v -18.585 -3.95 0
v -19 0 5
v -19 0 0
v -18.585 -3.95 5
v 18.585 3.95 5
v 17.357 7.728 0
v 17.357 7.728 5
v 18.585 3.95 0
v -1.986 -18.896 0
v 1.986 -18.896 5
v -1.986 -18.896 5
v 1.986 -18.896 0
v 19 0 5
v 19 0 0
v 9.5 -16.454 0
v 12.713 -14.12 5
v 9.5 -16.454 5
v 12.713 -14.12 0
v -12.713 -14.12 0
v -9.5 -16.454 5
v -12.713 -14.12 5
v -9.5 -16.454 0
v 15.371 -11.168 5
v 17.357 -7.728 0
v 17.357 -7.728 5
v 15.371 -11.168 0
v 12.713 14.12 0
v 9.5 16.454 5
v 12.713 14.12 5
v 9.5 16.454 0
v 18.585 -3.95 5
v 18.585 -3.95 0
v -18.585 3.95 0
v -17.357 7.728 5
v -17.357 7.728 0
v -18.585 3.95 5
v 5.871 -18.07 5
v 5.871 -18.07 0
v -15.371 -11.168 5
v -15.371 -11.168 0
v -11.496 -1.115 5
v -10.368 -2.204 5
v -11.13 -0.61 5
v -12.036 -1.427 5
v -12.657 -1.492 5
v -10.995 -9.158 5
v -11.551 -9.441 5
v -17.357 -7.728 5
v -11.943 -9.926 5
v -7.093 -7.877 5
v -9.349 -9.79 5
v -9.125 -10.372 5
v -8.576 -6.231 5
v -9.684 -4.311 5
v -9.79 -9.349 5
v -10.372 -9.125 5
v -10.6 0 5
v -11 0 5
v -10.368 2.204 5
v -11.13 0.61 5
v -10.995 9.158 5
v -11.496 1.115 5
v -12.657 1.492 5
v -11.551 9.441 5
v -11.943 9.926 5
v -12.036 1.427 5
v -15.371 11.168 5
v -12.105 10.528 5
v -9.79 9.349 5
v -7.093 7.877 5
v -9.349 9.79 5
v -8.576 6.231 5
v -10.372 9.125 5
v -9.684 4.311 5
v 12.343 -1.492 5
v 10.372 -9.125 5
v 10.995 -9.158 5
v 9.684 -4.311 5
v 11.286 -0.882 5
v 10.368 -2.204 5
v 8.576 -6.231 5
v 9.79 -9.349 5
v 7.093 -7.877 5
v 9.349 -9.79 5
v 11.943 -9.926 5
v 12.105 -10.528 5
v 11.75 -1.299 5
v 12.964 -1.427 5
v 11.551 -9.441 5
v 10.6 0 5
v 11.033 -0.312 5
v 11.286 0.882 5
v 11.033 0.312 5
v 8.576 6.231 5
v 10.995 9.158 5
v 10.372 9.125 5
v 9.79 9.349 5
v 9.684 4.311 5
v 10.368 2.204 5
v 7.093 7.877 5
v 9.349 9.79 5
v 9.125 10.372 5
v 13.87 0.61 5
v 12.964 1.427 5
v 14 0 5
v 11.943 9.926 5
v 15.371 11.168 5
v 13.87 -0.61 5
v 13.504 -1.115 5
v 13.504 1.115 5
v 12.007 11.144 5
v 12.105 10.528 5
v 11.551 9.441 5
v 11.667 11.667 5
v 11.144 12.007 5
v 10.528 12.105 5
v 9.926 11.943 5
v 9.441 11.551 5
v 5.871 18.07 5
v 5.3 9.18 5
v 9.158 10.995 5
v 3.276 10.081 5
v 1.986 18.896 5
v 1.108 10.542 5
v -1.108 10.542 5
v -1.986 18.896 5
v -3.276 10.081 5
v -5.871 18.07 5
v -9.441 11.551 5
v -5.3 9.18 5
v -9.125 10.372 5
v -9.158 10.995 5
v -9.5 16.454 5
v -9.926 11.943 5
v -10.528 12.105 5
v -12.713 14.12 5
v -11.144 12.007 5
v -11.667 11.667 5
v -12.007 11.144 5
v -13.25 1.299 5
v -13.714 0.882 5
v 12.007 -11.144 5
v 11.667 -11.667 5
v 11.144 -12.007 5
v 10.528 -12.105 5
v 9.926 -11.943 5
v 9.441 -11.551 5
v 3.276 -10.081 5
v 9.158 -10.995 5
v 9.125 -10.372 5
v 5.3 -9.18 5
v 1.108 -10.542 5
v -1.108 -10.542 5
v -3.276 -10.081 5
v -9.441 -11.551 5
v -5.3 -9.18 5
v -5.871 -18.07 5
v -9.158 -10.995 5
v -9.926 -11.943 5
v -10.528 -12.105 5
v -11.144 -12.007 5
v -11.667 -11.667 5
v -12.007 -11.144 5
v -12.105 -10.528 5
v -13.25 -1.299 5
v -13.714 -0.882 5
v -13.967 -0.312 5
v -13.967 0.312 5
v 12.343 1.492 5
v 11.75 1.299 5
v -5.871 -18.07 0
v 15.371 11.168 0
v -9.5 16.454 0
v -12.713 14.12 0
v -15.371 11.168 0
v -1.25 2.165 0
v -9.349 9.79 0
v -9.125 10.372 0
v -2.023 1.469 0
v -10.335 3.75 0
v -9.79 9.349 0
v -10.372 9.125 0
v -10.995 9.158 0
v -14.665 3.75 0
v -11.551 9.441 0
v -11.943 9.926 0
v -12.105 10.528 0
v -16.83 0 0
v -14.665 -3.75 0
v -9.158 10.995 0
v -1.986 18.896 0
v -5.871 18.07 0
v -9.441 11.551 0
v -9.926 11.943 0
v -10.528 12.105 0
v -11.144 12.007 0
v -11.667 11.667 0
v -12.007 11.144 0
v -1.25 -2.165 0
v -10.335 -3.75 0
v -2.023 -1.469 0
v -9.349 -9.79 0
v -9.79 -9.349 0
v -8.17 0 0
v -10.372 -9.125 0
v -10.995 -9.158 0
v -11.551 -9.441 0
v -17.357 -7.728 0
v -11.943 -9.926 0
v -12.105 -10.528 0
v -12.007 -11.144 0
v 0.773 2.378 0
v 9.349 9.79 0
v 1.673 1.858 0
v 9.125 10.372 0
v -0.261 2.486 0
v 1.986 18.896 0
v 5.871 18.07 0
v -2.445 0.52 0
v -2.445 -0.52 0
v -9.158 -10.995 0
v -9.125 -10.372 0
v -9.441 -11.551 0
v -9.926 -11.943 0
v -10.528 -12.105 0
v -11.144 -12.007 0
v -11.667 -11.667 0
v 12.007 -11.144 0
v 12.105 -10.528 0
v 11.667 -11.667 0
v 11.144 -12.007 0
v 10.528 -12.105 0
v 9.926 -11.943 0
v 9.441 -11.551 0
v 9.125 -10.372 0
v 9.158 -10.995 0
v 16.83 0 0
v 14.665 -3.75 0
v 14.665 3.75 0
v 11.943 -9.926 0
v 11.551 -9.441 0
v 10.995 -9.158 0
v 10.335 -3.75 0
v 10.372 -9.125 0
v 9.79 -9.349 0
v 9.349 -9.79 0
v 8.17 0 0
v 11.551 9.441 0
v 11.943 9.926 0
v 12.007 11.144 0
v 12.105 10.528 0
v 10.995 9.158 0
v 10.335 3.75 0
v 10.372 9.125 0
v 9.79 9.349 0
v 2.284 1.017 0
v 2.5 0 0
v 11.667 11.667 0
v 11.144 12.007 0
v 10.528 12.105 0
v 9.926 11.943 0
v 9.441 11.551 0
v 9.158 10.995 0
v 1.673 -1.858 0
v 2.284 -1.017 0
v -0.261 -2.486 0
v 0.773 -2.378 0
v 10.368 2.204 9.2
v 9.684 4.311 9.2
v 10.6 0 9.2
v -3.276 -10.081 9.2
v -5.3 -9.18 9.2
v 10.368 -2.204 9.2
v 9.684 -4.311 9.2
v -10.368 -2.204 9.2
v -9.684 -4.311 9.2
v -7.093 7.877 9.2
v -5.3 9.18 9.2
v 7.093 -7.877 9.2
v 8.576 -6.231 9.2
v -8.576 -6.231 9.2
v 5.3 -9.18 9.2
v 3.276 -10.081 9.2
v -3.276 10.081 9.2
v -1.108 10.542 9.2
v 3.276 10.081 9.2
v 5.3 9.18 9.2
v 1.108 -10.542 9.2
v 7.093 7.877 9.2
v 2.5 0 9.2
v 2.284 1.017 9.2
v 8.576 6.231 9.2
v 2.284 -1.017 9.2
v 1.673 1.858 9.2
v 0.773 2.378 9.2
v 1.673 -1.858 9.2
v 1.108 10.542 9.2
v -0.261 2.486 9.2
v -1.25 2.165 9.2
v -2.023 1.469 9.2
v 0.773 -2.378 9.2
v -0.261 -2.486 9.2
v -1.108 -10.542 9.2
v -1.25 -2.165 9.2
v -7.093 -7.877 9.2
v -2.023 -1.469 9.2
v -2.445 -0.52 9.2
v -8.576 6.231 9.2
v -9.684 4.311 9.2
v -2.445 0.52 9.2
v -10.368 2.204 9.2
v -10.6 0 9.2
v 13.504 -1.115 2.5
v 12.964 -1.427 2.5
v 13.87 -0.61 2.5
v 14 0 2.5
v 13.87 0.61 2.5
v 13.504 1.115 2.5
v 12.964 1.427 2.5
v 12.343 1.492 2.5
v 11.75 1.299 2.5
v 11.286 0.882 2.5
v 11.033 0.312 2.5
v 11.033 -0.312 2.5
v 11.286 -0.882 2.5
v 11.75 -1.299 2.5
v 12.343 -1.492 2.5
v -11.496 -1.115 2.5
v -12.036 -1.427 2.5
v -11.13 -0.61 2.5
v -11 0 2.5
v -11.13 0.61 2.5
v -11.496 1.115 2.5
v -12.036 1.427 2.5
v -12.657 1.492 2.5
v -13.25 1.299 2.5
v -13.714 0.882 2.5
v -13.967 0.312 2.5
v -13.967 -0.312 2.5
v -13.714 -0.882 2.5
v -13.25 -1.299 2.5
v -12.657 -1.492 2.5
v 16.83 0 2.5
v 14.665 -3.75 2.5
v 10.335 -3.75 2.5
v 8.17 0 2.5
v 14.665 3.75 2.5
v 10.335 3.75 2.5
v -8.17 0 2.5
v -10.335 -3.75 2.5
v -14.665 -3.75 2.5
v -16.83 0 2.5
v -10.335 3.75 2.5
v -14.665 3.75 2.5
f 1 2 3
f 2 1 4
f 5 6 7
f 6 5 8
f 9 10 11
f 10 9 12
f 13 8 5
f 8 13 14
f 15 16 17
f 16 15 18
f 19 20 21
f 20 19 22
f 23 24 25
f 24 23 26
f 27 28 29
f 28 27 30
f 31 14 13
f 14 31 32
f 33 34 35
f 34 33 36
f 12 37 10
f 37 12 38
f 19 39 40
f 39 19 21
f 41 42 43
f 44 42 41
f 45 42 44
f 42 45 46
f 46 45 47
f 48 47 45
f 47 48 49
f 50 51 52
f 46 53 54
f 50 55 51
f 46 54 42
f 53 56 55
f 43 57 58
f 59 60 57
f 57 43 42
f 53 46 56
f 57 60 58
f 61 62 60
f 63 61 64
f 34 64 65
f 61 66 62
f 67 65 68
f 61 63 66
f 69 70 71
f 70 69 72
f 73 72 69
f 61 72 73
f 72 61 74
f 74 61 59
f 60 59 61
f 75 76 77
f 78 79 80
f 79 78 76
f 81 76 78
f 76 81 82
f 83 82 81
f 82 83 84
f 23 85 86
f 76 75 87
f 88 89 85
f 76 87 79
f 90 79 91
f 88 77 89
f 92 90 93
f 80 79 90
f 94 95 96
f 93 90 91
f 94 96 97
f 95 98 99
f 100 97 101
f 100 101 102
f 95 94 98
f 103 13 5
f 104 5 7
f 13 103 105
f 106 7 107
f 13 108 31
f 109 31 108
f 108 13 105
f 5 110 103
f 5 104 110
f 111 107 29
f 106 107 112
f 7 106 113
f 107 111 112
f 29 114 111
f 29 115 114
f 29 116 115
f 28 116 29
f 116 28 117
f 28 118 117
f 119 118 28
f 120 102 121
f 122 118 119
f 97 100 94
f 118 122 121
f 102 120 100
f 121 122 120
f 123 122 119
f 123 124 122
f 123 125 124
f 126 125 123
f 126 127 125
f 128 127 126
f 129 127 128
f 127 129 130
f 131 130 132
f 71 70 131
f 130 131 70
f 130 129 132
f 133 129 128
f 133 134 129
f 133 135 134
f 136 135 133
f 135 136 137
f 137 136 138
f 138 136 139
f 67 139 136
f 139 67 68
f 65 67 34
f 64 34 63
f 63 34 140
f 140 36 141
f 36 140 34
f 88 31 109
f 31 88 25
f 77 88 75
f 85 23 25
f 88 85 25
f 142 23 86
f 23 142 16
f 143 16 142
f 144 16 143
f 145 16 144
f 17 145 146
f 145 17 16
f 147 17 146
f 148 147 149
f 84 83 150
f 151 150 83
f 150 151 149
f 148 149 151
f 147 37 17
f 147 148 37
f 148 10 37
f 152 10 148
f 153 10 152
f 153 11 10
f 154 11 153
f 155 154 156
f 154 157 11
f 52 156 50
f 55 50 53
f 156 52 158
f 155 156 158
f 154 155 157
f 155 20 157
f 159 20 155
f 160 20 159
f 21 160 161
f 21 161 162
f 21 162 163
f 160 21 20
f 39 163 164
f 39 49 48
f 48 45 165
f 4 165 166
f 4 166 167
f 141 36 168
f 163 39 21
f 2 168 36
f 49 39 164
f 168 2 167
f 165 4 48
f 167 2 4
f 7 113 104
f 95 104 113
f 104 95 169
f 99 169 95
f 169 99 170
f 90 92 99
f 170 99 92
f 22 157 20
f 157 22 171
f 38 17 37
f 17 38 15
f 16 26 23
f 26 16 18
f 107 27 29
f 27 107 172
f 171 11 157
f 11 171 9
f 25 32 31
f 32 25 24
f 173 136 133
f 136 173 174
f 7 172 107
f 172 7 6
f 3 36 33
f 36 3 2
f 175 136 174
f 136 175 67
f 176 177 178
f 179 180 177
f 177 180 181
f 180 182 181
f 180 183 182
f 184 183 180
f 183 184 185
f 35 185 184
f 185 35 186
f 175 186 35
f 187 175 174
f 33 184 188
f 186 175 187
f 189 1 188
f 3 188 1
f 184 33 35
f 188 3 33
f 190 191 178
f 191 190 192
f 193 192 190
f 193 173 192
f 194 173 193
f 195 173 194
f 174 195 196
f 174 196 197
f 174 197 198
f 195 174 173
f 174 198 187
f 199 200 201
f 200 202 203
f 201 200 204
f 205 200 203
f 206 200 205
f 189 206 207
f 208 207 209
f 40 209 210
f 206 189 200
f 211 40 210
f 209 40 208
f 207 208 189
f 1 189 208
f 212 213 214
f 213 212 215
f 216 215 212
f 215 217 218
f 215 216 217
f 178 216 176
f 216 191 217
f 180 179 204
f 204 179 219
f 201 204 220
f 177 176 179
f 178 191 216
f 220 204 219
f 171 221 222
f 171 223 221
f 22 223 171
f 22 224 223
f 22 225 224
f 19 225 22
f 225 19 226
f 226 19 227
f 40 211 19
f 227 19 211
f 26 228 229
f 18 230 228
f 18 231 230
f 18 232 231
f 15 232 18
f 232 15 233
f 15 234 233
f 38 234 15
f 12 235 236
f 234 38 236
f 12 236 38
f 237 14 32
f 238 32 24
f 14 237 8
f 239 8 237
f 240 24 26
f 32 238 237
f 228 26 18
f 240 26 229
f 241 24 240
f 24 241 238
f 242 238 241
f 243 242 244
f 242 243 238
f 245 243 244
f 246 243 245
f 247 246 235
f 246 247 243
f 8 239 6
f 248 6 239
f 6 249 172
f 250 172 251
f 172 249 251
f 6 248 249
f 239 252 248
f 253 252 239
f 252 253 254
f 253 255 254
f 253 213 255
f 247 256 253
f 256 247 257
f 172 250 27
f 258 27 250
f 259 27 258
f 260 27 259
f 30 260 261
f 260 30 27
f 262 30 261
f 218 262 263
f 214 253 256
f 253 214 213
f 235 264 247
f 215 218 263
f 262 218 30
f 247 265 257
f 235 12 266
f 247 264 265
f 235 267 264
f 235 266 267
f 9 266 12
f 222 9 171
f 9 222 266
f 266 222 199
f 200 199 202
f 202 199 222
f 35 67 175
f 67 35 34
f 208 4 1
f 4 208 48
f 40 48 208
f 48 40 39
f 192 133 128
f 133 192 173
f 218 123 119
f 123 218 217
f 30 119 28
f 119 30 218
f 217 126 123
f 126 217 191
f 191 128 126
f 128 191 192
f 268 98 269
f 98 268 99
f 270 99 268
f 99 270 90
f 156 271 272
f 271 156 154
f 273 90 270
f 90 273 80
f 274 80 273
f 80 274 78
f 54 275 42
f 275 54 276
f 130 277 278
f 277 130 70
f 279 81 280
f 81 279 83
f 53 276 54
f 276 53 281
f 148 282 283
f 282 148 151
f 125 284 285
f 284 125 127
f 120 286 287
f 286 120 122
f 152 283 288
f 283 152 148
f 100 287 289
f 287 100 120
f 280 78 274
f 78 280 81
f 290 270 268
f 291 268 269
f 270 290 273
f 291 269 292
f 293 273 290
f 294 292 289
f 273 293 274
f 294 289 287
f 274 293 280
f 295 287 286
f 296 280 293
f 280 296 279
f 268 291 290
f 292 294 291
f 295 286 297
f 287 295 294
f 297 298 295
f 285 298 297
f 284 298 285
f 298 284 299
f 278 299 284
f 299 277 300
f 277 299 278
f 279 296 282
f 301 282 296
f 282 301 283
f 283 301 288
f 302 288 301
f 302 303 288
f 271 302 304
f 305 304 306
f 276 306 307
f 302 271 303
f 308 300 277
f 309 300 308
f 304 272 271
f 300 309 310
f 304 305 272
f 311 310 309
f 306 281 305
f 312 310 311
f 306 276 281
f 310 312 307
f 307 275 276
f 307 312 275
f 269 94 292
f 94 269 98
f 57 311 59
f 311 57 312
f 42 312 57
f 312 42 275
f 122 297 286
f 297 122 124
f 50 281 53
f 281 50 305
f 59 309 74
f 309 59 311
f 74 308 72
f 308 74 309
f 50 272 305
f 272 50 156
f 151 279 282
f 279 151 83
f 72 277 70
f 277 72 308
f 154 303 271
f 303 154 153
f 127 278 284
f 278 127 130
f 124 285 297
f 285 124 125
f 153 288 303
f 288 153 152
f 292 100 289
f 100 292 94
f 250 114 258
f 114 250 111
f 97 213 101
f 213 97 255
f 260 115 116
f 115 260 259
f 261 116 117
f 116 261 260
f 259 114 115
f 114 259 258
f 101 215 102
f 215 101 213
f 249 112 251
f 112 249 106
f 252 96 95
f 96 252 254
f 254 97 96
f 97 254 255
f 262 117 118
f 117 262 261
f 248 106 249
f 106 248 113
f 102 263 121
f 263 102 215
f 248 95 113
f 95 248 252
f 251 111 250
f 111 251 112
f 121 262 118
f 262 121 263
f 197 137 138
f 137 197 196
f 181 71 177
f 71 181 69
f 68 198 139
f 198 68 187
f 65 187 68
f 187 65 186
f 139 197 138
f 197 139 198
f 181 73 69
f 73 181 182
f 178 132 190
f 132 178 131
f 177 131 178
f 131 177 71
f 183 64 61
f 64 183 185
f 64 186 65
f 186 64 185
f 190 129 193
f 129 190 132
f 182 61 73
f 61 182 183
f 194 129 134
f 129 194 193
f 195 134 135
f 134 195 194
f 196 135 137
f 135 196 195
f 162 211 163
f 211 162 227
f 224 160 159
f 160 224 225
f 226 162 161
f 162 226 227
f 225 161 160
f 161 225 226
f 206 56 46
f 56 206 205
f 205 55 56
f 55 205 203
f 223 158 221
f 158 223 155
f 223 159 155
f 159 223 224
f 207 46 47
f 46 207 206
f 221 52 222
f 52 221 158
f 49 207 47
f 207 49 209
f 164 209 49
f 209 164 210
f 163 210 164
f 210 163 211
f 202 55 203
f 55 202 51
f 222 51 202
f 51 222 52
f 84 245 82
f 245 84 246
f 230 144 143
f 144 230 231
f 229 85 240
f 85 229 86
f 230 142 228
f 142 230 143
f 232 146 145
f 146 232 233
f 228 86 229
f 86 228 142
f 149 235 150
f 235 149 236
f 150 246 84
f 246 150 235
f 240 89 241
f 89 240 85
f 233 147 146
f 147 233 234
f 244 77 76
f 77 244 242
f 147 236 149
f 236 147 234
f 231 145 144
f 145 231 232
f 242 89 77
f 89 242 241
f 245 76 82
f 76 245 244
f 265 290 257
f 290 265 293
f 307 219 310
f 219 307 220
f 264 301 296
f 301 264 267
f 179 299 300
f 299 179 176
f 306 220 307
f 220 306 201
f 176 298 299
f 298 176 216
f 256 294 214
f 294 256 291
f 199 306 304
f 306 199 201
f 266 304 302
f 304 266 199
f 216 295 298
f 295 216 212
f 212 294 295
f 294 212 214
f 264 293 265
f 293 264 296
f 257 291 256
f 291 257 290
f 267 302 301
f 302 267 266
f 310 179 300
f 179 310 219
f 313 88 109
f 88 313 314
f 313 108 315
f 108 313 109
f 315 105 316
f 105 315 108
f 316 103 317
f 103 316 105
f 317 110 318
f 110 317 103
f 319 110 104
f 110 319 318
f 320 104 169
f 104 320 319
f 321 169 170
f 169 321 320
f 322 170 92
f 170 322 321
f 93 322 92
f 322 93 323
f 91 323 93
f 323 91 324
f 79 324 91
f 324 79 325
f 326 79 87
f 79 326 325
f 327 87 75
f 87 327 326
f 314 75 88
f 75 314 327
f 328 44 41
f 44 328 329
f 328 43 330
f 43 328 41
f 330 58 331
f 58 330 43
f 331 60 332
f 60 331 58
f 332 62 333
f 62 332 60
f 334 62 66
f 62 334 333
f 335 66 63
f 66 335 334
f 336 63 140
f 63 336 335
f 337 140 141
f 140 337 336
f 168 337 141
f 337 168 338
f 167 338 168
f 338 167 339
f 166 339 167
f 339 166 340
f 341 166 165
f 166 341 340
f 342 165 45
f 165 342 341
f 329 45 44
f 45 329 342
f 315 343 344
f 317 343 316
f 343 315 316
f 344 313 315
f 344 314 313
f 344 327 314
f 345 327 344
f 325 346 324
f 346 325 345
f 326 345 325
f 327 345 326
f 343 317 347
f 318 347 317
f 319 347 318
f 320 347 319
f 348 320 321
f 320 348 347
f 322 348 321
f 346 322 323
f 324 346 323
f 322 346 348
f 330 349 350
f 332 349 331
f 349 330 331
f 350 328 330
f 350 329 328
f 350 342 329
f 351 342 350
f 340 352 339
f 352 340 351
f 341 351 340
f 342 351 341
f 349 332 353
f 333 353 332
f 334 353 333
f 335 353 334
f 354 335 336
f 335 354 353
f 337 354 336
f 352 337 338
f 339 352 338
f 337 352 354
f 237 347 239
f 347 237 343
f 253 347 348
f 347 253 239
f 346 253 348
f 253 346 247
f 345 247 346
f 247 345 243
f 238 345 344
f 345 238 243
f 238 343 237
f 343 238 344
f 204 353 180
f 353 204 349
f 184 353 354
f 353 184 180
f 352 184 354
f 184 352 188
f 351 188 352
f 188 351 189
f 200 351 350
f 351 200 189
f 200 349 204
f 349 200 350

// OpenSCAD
// Variable definitions for adjustment for particular vehicle
motor_plate_thickness = 5; // mm

// hub is the round section that "inserts" into the PW transmission from the motor
hub_diameter = 21.2;
hub_thickness = 4.2;

axle_hole_diameter = 5; // hole for motor axle

power_wheels_bolt_thread_diameter = 3;
power_wheels_nut_flat_width = 5; // semi-captive nut for stock PW bolt to screw into and hold motor plate
power_wheels_bolt_hole_separation = 25; // center-to-center distance of PW bolts

brushless_bolt_thread_diameter = 3;
brushless_bolt_count = 4; // or 2 or 3 depending on motor
brushless_bolt_separation = 30; // center-to-center diameter of brushless mount holes 

// designed with 3d-printing in mind, brushless-facing side of motor plate is mostly flat for print surface

// construct the object as a difference of the individual unions of positive shapes and negative holes
difference() {
    union() { // Positive shapes
        // motor plate
        linear_extrude(motor_plate_thickness) {
            motor_plate_diameter = brushless_bolt_separation + brushless_bolt_thread_diameter + motor_plate_thickness;
            circle(d=motor_plate_diameter);
        }
        // hub
        linear_extrude(hub_thickness + motor_plate_thickness) {
            circle(d=hub_diameter);
        }
    }
    union() { // Negative holes
        // move down one mm and make all holes longer than object for clearance
        translate([0,0,-1]) {
            hole_depth = motor_plate_thickness + hub_thickness + 2; // all holes through entire object + more
            // axle hole
            linear_extrude(hole_depth) {
                circle(d=axle_hole_diameter, $fn=15);
            }
            // PW bolt holes
            linear_extrude(hole_depth) {
                translate([power_wheels_bolt_hole_separation/2,0,0]) {
                    circle(d=power_wheels_bolt_thread_diameter, $fn=15);
                }
                translate([-power_wheels_bolt_hole_separation/2,0,0]) {
                    circle(d=power_wheels_bolt_thread_diameter, $fn=15);
                }
            }
            // PW bolt hexagonal captive nut hole
            linear_extrude(motor_plate_thickness/2 + 1) {
                translate([power_wheels_bolt_hole_separation/2,0,0]) {
                    hexagon(power_wheels_nut_flat_width);
                }
                translate([-power_wheels_bolt_hole_separation/2,0,0]) {
                    hexagon(power_wheels_nut_flat_width);
                }
            }
            // brushless motor bolt holes
            for(rotate_amount=[0:360/brushless_bolt_count:359]){
                rotate([0,0,rotate_amount + 360/8]){
                    echo("my rotation amount is: ", rotate_amount);
                    translate([brushless_bolt_separation/2,0,0]){
                        linear_extrude(hole_depth){
                            circle(d=brushless_bolt_thread_diameter, $fn=15);
                        }
                    }
                }
            }
        }
    }
}

module hexagon(flat_width) {
    circle_diameter = flat_width * sqrt(3);
    circle($fn=6, d=circle_diameter);
}
